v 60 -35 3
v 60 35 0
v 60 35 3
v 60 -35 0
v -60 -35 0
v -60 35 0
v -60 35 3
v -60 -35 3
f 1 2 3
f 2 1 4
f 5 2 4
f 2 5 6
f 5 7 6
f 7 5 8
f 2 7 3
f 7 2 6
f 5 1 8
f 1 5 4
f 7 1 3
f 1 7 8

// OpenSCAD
// Mini horizontal gel-electrophoresis box - buffer tank
// Print orientation: tank rests on XY plane, open top facing +Z

// ---------- Parameters ----------
outer_x      = 120;   // outer length (X)
outer_y      = 70;    // outer width (Y)
tank_h       = 40;    // outer height (Z)
wall         = 3;     // wall thickness
floor        = 3;     // floor thickness under inner volume
platform_x   = 60;    // platform length in X (centred)
platform_y   = outer_y; // platform spans full inner width
platform_top = 10;    // platform top height above inner floor
hole_d       = 2;     // electrode hole diameter
hole_y       = 0;     // electrode hole Y position
hole_z       = 30;    // electrode hole Z position

eps          = 0.5;   // cutter overshoot past faces
$fn          = 64;    // curve resolution

// ---------- Derived ----------
inner_h   = tank_h - floor;                    // inner floor-to-top height
platform_z = floor + platform_top;             // platform top (absolute Z)
chamber_h = inner_h - platform_top;            // chamber height above platform

// ---------- Model ----------
difference() {
    // Main tank body
    translate([-outer_x/2, -outer_y/2, 0])
        cube([outer_x, outer_y, tank_h]);

    // Central open channel (cut through, top to bottom)
    translate([-outer_x/2, -platform_y/2, floor])
        cube([outer_x, platform_y, tank_h - floor + eps]);

    // Raised platform for gel tray
    union() {
        translate([-platform_x/2, -platform_y/2, platform_z])
            cube([platform_x, platform_y, chamber_h + eps]);   // lower block
        translate([-platform_x/2, -platform_y/2, tank_h - wall])
            cube([platform_x, platform_y, wall + eps]);         // top cap
    }

    // Electrode holes through end walls, along X
    for (sx = [-1, 1])
        translate([sx > 0 ? outer_x/2 - hole_d : -outer_x/2, hole_y, hole_z])
            rotate([0, 90, 0])
                cylinder(d = hole_d, h = outer_y + 2*eps);
}
